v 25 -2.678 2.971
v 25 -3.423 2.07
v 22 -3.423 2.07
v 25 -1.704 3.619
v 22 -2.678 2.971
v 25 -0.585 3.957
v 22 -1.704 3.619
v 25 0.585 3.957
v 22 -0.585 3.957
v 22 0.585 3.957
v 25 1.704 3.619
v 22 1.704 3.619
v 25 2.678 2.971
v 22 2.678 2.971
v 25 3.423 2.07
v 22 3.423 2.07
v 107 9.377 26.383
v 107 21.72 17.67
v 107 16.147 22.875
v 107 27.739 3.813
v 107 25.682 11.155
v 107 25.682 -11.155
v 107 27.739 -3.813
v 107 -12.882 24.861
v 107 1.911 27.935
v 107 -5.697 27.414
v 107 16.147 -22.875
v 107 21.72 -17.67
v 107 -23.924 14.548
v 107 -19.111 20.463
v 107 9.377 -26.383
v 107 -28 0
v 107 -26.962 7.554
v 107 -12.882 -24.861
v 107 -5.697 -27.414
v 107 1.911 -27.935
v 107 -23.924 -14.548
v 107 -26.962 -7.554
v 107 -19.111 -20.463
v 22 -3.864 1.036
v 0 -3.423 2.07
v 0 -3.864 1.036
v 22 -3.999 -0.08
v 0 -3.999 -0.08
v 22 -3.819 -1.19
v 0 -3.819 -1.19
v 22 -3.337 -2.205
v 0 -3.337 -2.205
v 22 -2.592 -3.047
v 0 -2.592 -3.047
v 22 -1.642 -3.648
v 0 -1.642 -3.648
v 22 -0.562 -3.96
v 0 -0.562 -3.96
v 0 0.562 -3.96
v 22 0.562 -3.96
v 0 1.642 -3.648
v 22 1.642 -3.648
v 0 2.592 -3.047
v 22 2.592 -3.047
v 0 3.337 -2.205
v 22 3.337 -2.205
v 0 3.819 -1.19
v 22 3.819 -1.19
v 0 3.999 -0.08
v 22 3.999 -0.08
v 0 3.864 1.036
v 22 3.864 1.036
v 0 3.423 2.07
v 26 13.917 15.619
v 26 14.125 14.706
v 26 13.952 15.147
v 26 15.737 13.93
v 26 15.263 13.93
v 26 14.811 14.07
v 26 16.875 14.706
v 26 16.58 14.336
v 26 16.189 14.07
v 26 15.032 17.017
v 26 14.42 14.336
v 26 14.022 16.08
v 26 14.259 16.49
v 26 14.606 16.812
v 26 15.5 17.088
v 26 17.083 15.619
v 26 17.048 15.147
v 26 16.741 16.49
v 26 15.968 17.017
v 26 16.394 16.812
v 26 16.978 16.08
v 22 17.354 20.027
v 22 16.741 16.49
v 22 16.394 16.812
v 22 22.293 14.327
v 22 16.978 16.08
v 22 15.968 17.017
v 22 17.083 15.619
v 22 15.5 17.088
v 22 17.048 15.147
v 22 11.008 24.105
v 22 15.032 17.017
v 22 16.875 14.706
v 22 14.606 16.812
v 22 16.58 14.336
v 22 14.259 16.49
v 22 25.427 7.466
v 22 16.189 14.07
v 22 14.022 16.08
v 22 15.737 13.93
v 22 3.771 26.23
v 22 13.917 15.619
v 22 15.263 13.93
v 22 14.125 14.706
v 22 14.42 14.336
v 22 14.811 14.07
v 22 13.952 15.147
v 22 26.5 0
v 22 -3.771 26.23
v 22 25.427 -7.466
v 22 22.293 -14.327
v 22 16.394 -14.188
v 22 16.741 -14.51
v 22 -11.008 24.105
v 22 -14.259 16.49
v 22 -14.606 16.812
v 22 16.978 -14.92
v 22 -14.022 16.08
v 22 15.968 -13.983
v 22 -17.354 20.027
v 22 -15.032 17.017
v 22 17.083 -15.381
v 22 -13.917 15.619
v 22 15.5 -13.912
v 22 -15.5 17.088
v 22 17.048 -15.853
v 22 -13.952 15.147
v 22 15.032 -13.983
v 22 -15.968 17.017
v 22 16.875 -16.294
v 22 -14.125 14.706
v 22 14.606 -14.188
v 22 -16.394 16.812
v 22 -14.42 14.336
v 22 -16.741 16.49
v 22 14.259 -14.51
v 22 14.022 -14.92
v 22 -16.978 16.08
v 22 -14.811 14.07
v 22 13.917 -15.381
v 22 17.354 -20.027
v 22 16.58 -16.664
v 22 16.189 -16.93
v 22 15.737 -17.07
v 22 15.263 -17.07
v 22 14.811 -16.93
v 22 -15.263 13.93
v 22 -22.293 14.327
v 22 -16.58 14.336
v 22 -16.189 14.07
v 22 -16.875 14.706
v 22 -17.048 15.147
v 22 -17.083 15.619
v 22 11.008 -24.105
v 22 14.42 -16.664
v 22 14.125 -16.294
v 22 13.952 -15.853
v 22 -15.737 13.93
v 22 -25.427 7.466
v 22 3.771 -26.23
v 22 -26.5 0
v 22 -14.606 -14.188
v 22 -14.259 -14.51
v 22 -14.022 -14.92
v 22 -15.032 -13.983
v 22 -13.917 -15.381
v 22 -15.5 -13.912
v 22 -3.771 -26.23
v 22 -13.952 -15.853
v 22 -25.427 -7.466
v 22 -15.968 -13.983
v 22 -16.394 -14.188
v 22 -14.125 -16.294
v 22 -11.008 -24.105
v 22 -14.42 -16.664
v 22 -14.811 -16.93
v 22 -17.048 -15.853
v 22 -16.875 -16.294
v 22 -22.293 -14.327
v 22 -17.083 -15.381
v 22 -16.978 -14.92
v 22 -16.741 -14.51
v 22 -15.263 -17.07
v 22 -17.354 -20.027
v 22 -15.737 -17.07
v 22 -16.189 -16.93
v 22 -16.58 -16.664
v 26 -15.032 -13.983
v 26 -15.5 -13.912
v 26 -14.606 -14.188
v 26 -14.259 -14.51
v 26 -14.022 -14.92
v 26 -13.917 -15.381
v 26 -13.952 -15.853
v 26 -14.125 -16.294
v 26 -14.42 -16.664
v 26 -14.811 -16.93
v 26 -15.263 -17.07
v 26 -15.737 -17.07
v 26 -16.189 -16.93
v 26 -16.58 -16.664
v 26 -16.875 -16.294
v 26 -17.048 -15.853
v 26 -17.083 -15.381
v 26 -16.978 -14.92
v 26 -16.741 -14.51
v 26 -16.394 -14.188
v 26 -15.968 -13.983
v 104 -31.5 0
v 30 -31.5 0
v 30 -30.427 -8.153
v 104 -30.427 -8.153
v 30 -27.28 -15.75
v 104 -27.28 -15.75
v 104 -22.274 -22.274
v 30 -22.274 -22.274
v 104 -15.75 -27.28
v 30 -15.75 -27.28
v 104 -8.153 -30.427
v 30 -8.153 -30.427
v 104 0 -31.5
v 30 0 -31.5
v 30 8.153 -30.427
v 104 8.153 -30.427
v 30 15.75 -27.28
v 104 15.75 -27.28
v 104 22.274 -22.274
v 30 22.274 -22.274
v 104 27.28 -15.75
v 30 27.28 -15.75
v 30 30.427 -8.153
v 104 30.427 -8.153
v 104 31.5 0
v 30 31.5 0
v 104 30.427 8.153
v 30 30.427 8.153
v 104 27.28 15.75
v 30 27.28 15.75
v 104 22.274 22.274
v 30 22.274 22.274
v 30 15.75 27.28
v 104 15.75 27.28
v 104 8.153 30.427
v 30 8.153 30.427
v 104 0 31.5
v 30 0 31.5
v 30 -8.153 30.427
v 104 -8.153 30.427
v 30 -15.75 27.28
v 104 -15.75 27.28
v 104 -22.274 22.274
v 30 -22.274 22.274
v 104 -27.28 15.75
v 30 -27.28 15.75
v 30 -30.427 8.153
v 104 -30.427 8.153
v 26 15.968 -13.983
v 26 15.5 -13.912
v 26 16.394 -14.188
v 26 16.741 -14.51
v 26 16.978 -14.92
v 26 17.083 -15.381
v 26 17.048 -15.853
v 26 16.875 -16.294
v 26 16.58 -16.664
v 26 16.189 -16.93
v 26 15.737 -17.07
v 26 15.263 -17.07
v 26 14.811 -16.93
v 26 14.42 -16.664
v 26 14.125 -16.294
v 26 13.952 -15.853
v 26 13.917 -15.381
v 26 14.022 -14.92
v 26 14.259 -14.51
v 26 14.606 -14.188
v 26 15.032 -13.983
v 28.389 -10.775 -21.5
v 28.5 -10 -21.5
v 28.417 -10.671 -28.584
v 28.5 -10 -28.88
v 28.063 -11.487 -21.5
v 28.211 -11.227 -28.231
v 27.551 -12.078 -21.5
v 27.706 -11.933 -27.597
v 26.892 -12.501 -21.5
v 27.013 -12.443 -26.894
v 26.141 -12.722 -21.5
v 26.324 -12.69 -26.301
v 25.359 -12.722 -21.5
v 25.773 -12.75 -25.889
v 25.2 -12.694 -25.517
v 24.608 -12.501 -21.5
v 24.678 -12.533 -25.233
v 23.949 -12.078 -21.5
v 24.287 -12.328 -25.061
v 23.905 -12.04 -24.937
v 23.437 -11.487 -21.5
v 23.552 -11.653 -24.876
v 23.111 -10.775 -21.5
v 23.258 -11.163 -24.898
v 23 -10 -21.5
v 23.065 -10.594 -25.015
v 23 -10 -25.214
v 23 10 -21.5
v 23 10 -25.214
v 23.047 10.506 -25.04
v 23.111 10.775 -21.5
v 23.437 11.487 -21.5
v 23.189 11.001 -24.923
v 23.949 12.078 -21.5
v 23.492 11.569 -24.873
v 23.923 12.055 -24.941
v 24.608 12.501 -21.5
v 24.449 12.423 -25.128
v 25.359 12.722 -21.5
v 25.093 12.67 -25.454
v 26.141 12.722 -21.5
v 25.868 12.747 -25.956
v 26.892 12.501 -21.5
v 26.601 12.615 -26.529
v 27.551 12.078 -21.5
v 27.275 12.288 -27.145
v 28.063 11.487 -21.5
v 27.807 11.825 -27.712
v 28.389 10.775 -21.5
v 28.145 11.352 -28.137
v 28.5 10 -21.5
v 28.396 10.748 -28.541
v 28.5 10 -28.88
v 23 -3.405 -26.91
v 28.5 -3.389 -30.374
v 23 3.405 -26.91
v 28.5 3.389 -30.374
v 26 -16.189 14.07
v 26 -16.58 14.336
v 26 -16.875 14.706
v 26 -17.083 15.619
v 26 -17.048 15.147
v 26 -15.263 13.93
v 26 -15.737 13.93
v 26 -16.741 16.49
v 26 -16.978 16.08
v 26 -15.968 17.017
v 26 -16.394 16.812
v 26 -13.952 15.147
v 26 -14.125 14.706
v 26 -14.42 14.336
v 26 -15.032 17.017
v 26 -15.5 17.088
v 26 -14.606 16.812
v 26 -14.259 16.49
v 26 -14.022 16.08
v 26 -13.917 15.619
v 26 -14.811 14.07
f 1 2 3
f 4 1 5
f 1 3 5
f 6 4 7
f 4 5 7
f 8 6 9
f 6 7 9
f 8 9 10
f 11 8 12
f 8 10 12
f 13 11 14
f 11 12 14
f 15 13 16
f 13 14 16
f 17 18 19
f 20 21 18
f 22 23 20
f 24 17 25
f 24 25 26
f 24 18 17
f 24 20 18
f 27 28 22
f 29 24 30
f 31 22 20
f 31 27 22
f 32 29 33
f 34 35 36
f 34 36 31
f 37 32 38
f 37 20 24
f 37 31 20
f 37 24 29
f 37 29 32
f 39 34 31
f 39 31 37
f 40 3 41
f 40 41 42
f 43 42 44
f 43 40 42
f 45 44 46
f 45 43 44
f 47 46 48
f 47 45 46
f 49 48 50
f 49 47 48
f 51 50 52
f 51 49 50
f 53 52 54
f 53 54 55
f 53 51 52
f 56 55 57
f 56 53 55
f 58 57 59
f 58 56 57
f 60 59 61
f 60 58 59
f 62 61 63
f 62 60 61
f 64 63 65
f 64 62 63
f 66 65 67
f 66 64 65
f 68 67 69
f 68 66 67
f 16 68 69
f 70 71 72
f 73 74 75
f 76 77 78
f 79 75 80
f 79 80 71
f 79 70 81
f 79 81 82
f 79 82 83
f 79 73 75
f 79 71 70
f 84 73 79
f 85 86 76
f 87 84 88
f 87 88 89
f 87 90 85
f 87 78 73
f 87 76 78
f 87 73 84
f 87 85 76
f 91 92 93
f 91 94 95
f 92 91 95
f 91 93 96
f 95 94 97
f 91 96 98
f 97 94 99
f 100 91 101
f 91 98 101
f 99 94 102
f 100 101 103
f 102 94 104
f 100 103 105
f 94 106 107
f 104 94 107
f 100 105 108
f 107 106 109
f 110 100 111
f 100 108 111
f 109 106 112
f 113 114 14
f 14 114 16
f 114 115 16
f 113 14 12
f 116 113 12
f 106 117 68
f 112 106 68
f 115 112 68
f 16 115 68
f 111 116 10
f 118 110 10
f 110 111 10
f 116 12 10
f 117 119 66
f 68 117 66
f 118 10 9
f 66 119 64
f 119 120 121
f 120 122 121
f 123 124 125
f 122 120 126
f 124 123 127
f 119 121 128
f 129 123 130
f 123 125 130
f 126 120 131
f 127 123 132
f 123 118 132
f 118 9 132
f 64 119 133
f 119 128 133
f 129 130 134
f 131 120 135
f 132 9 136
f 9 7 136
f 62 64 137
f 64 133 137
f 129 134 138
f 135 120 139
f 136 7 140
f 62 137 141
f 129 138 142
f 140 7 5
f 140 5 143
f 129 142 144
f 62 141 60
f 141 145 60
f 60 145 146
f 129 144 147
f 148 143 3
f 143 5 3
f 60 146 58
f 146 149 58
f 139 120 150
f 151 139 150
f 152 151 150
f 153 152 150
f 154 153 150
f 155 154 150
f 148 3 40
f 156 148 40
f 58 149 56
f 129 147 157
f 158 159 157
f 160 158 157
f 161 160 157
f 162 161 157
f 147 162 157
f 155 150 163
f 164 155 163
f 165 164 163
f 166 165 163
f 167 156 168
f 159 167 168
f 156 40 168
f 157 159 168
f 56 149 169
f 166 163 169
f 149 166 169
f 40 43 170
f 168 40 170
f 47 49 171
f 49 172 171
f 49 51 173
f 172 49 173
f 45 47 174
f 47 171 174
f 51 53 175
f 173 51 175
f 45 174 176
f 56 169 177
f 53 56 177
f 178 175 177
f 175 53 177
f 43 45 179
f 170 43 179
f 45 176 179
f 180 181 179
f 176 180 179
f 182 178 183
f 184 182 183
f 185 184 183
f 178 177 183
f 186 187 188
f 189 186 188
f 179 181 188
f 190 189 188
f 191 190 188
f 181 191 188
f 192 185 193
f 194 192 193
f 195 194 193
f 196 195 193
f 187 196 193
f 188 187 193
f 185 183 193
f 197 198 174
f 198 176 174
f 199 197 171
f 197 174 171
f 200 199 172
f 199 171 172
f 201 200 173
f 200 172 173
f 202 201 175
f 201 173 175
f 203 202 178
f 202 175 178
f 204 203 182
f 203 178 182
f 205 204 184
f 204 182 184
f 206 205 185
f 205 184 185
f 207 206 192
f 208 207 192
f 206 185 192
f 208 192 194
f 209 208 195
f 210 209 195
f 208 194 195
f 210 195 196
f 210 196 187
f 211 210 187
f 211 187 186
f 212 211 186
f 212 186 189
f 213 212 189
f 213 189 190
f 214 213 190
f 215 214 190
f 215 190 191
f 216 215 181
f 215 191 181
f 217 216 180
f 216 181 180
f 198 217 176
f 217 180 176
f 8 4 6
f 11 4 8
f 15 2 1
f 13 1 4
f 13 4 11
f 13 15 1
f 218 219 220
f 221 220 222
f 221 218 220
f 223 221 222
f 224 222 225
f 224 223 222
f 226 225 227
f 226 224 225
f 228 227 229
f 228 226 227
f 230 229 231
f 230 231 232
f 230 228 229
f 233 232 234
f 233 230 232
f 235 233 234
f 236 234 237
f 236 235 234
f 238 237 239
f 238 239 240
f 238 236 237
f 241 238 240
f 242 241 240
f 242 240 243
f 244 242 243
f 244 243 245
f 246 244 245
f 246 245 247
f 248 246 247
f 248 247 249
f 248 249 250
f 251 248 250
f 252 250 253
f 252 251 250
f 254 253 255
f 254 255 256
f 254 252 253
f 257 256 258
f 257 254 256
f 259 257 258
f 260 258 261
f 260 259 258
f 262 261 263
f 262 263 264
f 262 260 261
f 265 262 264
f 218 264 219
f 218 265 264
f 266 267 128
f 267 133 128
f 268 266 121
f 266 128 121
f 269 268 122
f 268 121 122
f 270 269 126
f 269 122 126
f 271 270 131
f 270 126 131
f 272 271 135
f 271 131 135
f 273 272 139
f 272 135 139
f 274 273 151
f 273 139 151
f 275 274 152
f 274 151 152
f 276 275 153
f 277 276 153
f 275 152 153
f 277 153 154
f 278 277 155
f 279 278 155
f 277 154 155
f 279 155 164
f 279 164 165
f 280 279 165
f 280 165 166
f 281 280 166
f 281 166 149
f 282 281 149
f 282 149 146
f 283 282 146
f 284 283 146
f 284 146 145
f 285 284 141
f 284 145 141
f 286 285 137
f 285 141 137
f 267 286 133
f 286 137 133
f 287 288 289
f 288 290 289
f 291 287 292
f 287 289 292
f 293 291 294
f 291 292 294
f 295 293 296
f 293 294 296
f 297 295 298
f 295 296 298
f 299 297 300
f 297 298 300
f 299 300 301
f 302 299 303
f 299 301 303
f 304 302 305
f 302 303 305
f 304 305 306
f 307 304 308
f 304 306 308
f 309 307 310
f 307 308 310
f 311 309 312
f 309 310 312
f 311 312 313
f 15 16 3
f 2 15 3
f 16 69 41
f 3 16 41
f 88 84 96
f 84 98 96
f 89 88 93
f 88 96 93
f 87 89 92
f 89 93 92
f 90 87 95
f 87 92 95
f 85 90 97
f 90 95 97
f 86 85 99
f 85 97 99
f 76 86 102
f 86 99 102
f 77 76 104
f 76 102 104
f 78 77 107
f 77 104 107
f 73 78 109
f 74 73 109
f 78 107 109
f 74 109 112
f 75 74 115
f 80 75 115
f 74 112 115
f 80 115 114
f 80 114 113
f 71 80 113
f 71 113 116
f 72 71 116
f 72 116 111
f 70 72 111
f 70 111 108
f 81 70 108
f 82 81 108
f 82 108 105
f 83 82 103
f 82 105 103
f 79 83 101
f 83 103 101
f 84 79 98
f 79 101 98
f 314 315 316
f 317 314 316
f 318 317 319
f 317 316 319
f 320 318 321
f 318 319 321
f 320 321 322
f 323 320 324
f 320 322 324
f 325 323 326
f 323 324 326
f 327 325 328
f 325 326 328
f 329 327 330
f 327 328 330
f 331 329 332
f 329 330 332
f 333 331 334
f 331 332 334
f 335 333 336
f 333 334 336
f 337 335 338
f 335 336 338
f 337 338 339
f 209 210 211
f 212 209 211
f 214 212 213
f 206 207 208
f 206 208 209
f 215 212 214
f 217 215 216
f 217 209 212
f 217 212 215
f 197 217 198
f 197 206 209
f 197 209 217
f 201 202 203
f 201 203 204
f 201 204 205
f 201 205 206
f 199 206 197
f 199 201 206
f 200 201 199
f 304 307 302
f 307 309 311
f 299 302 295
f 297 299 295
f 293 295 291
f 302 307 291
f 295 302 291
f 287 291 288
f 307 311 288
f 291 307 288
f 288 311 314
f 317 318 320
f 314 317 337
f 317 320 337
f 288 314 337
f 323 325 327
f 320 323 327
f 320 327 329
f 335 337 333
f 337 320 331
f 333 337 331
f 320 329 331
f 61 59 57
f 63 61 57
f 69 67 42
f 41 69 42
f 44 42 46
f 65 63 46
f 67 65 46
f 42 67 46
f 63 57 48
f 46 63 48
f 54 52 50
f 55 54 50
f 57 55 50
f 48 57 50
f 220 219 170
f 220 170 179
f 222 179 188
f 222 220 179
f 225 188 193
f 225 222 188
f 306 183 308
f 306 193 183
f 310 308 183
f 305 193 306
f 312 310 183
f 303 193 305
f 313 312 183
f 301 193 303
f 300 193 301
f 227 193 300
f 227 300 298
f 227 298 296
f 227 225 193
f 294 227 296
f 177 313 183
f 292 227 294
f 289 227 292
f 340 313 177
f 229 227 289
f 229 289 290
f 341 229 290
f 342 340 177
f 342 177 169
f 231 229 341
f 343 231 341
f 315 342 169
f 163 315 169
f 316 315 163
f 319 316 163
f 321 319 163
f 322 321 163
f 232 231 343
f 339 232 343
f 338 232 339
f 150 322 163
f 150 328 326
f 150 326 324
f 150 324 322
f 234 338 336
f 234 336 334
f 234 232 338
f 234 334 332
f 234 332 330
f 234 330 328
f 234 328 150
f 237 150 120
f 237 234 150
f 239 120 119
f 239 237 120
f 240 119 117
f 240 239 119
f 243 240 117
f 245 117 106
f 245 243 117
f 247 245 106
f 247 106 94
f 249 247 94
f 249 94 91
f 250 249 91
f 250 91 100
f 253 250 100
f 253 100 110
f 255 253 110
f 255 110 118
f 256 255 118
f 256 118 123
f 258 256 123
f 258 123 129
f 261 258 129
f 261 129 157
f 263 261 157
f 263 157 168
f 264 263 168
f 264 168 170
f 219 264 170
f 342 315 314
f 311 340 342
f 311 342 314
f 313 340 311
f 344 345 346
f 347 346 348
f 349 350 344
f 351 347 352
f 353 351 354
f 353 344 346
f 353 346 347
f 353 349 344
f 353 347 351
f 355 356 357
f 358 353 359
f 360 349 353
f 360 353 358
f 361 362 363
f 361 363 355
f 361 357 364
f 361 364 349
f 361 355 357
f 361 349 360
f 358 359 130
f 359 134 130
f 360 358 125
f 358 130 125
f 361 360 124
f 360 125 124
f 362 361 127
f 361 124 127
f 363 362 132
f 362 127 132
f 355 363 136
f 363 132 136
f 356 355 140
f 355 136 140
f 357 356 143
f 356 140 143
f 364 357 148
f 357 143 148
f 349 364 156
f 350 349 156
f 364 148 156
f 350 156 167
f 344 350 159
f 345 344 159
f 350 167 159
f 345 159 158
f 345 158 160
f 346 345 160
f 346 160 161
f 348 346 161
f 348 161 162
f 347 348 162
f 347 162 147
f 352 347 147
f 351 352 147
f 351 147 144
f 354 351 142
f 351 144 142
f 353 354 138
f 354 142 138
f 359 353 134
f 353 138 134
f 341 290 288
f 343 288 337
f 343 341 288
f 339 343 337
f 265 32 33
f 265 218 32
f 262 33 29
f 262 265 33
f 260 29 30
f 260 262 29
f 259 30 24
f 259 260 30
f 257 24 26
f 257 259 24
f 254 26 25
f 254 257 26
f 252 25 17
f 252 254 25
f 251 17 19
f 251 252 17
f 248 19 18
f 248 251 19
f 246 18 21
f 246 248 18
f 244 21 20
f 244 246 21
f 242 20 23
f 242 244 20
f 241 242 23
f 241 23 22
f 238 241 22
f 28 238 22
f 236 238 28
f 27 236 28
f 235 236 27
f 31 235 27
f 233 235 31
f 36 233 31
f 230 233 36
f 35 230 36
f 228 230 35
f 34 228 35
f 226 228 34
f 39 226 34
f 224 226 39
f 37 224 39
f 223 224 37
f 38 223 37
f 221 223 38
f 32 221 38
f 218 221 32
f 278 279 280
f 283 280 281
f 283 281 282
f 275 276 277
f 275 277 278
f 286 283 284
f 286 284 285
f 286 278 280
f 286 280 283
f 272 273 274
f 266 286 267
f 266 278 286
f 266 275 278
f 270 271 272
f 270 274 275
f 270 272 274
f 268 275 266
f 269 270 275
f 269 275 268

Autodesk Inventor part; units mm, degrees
ref_plane "YZ Plane" through (0, 0, 0) normal (1, 0, 0) x (0, 1, 0)
ref_plane "XZ Plane" through (0, 0, 0) normal (0, 1, 0) x (-1, 0, 0)
sketch "Sketch1" plane through (0, 0, 0) normal (0, 0, 1) x (1, 0, 0)
  line L0 (0, 0) -> (0, -4)
  line L1 (0, -4) -> (22, -4)
  line L2 (22, -4) -> (22, -26.5)
  line L3 (22, -26.5) -> (30, -31.5)
  line L4 (30, -31.5) -> (104, -31.5)
  line L5 (104, -31.5) -> (107, -28)
  line L6 (107, -28) -> (107, 0)
  line L7 (-21.4, 0) -> (128.4, 0) projected
  line L8 (0, -37.8) -> (0, 6.3) projected
  line L9 (107, 0) -> (0, 0)
  dimension "d7" = 22.5
  dimension "d9" = 8
  dimension "d10" = 74
  dimension "d14" = 4
  dimension "d16" = 31.5
  dimension "d17" = 28
  dimension "d18" = 22
  dimension "d40" = 85
revolve "motor body" add sketch "Sketch1" angle 360 about axis through (-10, 0, 0) along (1, 0, 0)
sketch "Sketch4" plane through (0, 0, 0) normal (-1, 0, 0) x (0, 0, 1)
  circle A0 centre (0, 0) radius 4
  circle A1 centre (0, 0) radius 4 projected
  line L0 (2.0699, 3.4228) -> (2.0699, -3.4228)
  line L1 (0, -44.1) -> (0, 44.1) projected
extrude "axis slot" cut sketch "Sketch4" against normal blind 25 contours A0 L0
sketch "Sketch5" plane through (22, 0, 0) normal (-1, 0, 0) x (0, 0, 1)
  circle A0 centre (15.5, 15.5) radius 1.5875
  line L0 (0, -44.1) -> (0, 44.1) projected
  line L1 (-44.1, 0) -> (44.1, 0) projected
  circle A1 centre (15.5, -15.5) radius 1.5875
  circle A2 centre (-15.5, 15.5) radius 1.5875
  circle A3 centre (-15.5, -15.5) radius 1.5875
  point P0 (0, 0)
  dimension "d22" = 3.175
  dimension "d25" = 31
  dimension "d28" = 31
  dimension "d31" = 15.5
  dimension "d32" = 15.5
extrude "mounting holes" cut sketch "Sketch5" against normal blind 4
ref_plane "Work Plane1" through (67, 0, -31.5) normal (0, 0, 1) x (1, 0, 0)
sketch "Sketch6" plane through (67, 0, -31.5) normal (0, 0, 1) x (1, 0, 0)
  line L0 (-41.25, 10) -> (-41.25, -10) construction
  line L1 (-44, 10) -> (-44, -10)
  line L2 (-38.5, -10) -> (-38.5, 10)
  arc A0 (-38.5, 10) -> (-44, 10) centre (-41.25, 10) ccw
  arc A1 (-44, -10) -> (-38.5, -10) centre (-41.25, -10) ccw
  line L3 (-45, 26.5) -> (-45, -26.5) projected
  line L4 (-37, 31.5) -> (-37, -31.5) projected
  line L5 (-92, 0) -> (62, 0) projected
  point P0 (-67, 0)
  point P1 (-41.25, 0)
  dimension "d35" = 20
  dimension "d36" = 5.5
  dimension "d37" = 1.5
extrude "cable hole" cut sketch "Sketch6" along normal blind 10
properties part number "motor"
